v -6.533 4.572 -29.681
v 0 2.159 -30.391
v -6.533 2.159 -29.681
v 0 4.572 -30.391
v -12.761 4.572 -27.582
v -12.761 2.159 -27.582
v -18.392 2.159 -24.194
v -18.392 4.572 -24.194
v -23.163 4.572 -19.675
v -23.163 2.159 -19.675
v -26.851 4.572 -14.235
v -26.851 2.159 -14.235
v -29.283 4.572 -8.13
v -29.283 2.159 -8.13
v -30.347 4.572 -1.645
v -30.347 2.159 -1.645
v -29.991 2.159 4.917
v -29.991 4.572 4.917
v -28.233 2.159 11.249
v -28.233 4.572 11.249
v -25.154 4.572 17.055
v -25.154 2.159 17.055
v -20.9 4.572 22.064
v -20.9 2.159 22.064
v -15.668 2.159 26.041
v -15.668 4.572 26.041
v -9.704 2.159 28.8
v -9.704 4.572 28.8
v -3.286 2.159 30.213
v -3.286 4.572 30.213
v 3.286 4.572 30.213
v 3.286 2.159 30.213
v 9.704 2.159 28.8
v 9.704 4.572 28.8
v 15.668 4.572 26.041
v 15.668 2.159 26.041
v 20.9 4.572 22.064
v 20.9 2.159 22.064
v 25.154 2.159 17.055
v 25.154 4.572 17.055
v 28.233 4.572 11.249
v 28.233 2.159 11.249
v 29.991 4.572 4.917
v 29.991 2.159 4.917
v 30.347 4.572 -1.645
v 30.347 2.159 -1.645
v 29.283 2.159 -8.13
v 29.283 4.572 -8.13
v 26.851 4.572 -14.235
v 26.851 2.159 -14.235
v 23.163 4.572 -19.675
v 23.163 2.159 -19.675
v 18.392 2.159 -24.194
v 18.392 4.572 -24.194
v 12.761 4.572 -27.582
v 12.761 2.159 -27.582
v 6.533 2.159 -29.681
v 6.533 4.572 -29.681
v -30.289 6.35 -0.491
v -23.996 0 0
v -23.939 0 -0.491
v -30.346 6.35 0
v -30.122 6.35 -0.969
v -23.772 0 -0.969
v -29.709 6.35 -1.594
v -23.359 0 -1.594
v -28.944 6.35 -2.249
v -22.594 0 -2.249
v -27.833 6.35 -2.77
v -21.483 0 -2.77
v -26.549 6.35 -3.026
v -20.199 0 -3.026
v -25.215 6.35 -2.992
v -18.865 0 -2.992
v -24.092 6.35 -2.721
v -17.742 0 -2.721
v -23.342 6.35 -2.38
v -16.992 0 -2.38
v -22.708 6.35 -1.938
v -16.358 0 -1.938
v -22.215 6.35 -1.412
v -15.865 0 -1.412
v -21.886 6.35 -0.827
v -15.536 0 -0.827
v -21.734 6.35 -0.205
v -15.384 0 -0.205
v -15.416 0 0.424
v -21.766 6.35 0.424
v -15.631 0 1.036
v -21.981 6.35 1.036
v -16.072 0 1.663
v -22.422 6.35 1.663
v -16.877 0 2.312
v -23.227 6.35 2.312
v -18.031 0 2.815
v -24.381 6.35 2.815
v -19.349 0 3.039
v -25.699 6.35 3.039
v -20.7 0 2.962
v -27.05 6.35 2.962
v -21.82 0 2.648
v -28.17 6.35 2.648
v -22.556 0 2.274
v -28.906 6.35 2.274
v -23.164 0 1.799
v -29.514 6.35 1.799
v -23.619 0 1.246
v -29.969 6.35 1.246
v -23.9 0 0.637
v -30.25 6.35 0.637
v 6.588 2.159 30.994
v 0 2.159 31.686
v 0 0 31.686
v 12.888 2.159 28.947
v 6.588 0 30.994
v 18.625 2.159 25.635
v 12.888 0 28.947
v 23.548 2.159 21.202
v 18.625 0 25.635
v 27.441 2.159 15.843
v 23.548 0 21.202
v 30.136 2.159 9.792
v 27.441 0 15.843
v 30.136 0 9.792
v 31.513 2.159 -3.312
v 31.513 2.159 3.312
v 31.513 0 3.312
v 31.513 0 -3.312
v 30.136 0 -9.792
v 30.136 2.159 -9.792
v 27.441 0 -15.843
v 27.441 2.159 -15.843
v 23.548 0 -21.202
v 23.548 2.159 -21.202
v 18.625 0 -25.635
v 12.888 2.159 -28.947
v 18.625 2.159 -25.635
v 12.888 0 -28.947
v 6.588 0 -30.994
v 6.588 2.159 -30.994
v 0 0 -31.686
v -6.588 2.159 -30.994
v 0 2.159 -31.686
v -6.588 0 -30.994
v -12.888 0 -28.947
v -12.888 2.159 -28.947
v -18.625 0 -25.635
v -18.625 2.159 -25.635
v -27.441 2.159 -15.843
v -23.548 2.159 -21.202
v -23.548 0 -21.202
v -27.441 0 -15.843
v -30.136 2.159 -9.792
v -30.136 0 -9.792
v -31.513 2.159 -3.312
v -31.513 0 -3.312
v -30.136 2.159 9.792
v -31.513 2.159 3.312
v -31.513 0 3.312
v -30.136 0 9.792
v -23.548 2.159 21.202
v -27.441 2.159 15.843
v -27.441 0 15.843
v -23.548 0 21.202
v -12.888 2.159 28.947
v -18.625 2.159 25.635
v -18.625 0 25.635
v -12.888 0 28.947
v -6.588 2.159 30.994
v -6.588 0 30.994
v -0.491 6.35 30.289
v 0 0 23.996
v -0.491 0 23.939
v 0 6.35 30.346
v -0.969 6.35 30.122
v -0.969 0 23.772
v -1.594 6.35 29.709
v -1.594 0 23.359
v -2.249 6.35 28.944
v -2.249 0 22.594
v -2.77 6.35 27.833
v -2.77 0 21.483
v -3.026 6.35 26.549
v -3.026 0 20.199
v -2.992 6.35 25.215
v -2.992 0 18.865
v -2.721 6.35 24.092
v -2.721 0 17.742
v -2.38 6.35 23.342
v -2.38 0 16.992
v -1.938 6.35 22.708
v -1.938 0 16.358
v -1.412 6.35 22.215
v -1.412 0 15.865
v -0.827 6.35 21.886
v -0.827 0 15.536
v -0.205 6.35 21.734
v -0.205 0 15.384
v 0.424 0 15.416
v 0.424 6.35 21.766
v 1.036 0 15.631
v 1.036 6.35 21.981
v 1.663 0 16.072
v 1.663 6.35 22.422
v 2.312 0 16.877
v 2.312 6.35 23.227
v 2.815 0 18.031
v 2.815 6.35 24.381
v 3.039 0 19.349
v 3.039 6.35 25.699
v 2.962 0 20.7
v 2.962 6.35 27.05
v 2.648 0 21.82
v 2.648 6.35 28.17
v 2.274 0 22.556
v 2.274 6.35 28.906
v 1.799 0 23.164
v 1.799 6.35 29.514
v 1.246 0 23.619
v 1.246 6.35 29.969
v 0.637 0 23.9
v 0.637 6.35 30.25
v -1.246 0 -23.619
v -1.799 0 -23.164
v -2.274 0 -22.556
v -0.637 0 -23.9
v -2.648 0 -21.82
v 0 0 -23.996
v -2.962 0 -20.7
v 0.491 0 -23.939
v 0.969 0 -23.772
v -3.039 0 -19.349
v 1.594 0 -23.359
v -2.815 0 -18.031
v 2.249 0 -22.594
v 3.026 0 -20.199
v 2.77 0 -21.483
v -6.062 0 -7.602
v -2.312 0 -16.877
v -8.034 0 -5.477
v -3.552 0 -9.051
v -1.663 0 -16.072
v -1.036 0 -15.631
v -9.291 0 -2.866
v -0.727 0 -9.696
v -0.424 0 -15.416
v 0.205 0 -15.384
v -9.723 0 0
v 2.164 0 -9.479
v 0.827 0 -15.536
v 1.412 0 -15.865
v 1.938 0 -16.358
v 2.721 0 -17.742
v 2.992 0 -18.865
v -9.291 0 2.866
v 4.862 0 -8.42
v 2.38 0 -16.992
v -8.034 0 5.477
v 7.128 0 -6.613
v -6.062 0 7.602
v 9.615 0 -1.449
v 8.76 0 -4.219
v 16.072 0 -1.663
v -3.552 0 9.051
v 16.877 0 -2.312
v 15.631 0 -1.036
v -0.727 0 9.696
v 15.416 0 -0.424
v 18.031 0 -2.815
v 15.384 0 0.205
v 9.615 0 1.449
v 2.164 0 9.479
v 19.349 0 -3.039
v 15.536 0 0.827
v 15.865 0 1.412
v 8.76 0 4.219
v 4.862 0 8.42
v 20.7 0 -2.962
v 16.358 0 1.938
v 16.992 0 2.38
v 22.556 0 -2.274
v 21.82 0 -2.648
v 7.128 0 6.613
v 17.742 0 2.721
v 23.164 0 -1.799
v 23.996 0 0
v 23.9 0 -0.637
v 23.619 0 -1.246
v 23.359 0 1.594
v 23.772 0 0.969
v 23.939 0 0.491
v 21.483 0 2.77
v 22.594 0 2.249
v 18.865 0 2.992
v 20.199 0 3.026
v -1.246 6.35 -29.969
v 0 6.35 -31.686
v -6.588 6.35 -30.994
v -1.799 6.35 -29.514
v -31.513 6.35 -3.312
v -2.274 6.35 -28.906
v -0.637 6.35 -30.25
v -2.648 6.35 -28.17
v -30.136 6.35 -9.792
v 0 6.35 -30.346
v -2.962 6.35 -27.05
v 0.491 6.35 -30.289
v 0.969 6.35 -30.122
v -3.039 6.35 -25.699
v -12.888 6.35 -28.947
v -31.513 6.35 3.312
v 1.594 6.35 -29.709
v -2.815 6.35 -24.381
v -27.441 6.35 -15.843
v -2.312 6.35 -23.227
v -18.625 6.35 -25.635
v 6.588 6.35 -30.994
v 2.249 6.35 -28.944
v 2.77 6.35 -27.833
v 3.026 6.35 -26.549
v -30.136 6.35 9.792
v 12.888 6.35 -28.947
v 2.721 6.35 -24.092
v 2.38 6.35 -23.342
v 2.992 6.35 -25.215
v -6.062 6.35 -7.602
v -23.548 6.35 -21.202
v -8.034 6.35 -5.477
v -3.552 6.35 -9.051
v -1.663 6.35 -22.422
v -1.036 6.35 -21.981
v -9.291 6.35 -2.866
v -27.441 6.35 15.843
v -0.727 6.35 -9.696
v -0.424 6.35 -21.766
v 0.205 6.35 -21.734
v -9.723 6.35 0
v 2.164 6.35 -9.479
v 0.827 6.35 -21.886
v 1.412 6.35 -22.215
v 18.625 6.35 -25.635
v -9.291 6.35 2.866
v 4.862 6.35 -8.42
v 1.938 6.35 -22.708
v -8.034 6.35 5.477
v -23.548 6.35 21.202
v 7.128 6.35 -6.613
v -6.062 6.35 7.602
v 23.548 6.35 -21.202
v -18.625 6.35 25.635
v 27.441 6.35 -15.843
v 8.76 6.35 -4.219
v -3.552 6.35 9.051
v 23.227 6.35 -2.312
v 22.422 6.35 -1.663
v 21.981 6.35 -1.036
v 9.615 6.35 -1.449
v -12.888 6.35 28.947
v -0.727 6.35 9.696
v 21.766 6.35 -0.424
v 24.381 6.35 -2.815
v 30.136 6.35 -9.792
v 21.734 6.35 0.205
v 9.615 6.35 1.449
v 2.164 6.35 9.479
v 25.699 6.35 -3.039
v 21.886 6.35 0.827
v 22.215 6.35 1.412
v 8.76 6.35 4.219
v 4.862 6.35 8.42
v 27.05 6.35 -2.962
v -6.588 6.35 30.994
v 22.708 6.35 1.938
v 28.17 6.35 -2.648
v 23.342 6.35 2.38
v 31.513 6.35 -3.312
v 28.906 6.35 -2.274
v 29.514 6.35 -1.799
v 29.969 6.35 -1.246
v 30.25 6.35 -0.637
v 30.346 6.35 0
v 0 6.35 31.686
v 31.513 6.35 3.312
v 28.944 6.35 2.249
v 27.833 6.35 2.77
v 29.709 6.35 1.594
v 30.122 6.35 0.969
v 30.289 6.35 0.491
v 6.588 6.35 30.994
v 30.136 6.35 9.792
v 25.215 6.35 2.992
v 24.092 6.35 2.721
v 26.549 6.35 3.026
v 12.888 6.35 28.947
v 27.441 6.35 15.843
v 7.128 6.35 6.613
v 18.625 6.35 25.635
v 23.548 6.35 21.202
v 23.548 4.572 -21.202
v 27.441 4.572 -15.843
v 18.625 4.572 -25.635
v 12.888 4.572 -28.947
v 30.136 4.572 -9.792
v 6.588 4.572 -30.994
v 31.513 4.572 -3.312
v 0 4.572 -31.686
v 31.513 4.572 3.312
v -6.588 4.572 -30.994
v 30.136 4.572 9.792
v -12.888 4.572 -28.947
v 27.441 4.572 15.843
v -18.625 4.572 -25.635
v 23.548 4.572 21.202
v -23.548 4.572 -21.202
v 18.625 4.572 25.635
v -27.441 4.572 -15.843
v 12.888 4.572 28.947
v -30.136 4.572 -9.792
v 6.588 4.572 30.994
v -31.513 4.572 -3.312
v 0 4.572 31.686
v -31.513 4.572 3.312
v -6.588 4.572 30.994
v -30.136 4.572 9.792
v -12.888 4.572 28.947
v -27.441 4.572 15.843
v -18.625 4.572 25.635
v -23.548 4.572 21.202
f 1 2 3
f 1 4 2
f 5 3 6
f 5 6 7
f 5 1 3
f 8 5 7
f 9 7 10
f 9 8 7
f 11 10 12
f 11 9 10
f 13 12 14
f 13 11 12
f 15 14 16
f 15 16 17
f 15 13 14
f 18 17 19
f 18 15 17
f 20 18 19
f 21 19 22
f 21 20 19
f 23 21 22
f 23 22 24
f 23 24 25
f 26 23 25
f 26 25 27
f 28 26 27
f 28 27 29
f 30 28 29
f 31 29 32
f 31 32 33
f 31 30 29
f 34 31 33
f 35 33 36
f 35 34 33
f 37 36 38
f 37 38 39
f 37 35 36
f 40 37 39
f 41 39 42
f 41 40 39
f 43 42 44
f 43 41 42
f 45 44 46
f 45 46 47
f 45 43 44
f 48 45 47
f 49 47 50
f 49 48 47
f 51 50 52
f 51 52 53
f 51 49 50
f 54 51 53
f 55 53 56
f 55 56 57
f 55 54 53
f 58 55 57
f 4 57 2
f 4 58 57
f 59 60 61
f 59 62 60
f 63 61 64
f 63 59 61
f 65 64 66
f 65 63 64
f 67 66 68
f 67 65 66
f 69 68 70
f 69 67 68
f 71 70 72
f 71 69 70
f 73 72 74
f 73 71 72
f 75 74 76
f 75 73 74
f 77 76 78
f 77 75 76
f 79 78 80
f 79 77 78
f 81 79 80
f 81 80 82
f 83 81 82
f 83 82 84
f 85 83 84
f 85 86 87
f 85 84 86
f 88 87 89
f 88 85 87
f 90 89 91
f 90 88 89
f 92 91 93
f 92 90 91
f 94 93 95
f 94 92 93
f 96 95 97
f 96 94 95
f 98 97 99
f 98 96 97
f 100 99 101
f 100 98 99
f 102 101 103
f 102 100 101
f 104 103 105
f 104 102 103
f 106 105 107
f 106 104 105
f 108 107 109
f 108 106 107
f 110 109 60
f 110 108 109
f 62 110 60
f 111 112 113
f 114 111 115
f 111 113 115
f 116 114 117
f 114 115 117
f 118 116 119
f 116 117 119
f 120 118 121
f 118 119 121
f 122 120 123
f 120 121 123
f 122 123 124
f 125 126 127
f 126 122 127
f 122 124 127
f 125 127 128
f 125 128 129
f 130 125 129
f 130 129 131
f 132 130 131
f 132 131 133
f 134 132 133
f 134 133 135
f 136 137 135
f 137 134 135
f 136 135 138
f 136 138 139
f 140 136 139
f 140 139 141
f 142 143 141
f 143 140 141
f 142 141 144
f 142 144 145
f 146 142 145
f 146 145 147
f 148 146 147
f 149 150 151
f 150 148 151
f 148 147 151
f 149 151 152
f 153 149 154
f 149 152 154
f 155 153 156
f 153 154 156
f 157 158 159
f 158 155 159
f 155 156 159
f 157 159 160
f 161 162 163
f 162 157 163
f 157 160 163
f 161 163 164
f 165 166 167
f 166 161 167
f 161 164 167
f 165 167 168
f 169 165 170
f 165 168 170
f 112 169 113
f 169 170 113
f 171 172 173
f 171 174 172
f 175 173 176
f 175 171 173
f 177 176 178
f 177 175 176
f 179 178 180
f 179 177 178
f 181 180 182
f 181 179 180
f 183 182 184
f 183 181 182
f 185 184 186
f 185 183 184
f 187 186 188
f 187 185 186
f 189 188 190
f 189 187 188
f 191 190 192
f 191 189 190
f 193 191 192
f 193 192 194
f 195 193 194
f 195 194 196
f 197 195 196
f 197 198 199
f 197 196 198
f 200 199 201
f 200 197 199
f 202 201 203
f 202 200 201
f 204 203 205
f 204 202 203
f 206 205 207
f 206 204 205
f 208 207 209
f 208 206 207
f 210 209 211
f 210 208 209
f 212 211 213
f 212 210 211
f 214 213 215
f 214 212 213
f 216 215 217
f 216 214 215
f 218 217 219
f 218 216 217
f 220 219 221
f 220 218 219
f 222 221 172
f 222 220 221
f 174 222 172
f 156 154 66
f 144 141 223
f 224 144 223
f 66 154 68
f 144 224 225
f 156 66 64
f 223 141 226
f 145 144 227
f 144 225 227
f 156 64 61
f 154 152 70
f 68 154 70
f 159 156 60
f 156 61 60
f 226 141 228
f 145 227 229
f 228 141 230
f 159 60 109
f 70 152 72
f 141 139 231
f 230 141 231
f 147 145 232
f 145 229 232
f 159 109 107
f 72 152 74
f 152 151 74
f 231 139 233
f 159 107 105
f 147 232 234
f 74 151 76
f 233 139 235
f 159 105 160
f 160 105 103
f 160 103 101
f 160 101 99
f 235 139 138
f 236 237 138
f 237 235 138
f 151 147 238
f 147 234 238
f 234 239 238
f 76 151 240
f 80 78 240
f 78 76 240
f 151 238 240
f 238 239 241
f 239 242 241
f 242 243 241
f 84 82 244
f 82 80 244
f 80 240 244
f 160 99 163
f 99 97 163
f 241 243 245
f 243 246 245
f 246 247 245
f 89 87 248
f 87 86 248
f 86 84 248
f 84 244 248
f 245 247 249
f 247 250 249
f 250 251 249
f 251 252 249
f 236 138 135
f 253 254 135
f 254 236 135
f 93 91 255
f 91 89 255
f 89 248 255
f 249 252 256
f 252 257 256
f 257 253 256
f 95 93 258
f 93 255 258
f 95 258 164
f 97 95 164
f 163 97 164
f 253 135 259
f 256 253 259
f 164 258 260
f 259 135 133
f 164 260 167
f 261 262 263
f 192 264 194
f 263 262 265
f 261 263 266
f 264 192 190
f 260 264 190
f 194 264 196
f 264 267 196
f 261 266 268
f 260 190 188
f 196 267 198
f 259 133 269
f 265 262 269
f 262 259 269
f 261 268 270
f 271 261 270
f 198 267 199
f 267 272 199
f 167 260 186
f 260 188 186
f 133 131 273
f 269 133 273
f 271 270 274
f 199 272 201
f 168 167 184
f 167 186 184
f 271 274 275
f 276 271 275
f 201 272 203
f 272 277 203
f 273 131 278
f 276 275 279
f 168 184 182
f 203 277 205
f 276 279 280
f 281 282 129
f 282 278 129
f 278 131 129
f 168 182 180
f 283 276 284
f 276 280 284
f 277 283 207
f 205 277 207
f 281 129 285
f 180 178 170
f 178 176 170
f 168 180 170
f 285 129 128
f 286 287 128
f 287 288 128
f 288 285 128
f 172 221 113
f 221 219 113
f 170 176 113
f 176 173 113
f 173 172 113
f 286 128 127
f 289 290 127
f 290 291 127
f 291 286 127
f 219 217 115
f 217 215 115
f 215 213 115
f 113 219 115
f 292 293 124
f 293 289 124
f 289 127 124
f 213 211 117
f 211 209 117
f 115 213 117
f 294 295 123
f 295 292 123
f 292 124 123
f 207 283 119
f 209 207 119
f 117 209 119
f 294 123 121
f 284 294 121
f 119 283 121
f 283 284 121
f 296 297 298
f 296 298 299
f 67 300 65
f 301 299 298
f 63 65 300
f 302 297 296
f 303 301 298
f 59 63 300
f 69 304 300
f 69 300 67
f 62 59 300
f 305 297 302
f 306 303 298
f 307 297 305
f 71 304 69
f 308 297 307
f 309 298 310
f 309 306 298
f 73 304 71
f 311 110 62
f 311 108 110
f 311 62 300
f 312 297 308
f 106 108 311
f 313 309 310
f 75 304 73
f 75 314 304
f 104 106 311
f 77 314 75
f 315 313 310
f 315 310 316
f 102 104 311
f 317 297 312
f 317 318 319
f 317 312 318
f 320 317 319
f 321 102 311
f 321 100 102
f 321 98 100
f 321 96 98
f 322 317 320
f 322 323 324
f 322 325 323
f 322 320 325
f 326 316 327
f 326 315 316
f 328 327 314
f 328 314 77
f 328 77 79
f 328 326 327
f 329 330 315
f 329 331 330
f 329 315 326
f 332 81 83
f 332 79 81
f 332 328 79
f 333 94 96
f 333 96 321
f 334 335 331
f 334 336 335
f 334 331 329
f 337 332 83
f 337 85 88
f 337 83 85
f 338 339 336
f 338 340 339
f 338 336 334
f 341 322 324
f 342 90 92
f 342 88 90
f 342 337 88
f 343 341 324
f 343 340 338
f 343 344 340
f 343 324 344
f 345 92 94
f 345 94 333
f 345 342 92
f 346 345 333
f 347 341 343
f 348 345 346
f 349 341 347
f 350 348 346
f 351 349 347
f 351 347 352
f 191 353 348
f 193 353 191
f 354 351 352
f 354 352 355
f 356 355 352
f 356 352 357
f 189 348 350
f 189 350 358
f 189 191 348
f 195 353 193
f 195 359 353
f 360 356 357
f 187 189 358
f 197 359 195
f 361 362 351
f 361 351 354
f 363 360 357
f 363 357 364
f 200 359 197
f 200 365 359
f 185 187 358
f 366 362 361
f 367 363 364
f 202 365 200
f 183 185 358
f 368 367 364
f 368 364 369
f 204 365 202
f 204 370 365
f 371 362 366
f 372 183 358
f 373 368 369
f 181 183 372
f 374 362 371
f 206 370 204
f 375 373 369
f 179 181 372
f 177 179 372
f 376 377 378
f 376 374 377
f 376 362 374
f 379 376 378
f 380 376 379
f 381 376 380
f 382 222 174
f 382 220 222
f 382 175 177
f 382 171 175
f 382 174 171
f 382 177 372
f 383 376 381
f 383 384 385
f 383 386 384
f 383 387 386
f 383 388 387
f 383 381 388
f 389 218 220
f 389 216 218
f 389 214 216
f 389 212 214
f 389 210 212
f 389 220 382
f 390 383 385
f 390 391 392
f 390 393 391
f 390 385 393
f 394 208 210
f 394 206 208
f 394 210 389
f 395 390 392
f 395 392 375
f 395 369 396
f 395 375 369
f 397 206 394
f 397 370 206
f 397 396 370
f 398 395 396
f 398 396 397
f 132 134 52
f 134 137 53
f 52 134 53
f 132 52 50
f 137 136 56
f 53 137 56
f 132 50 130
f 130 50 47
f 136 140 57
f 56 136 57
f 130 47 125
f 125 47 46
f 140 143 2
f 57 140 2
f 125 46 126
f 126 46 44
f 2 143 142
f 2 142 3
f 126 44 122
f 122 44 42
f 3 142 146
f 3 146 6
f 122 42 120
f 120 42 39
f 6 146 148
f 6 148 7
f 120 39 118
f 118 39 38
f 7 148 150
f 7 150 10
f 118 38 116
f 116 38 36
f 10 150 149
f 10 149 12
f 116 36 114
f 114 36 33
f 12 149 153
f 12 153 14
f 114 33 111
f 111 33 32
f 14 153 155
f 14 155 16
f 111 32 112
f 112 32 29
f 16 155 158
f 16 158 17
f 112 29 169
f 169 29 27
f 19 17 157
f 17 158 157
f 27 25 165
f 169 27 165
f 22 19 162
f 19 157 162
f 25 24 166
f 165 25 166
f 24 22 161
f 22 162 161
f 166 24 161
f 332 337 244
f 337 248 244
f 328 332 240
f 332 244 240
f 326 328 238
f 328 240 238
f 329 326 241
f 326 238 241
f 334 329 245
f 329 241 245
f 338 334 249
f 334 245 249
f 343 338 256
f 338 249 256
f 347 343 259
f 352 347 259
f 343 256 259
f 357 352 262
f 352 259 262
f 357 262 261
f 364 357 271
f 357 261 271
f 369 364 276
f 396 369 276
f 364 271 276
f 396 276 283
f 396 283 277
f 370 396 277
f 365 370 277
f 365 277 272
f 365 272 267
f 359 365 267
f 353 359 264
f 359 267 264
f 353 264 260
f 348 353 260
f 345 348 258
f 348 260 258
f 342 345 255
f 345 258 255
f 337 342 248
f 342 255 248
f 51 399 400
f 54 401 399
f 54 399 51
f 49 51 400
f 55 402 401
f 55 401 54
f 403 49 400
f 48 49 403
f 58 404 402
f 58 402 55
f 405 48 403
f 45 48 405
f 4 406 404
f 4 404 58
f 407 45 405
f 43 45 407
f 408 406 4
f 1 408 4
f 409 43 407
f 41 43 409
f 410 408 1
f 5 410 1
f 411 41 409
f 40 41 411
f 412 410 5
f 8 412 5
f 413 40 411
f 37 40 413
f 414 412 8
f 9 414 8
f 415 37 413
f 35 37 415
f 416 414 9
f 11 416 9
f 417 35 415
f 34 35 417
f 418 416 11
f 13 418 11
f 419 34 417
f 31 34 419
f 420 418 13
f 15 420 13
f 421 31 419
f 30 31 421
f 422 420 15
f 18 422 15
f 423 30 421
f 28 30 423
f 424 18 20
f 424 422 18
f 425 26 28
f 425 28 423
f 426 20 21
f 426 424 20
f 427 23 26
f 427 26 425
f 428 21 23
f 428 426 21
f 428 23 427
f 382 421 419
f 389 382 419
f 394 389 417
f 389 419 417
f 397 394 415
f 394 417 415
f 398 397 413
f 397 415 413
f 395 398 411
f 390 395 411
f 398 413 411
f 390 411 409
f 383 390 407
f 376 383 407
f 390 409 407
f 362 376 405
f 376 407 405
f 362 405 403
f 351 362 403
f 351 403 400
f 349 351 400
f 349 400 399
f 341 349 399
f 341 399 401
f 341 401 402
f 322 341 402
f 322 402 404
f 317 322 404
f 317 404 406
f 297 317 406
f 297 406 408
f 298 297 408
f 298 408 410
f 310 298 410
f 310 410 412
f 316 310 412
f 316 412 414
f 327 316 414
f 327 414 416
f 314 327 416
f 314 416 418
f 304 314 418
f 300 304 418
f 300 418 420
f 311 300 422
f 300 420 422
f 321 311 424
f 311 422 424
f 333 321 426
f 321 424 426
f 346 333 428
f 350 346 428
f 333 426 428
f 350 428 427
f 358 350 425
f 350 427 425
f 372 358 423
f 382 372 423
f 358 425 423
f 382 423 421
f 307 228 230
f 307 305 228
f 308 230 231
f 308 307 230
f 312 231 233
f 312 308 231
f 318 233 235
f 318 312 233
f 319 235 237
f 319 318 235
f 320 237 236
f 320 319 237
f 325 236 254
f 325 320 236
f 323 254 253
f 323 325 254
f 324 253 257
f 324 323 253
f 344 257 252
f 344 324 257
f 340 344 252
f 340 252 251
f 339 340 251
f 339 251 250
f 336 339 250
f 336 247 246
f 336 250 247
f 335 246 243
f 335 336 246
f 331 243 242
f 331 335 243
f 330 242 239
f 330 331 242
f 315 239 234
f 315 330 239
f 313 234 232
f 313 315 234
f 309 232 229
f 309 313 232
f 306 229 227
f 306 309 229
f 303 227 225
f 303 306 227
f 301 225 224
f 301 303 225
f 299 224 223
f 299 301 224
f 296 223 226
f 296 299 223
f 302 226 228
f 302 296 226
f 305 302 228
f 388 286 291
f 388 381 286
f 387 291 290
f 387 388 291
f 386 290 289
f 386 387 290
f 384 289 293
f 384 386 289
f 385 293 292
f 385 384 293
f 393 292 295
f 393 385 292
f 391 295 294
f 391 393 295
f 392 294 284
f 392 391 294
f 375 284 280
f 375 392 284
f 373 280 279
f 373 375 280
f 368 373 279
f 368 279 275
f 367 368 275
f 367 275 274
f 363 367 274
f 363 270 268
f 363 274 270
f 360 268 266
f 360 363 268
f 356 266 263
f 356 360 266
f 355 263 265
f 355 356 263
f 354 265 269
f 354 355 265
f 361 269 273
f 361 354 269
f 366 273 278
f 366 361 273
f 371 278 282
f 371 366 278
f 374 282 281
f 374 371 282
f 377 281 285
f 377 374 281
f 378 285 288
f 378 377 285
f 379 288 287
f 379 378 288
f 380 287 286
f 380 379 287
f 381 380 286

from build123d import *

# Parameters (mm, degrees)
SKETCH1_R                   = 31.6865
BOSS_EXTRUDE1_DEPTH         = 6.35
CIRPATTERN1_COUNT           = 4
SKETCH5_W                   = 1.2954
SKETCH5_H                   = 2.413
F_3_4_CLEARANCE_HOLE1_D     = 19.44624
F_3_4_CLEARANCE_HOLE1_DEPTH = 6.35
F_3_4_CLEARANCE_HOLE1_TIP   = 5.842239902


with BuildPart() as part:
    # Sketch1 → Boss-Extrude1 (new body)
    with BuildSketch(Plane(origin=(0, 0, 0), x_dir=(1, 0, 0), z_dir=(0, 1, 0))):
        with Locations(Location((0, 0, 0), (0, 0, 270))):
            Circle(SKETCH1_R)
    extrude(amount=BOSS_EXTRUDE1_DEPTH)

    # Sketch4 → Cut-Revolve1 (revolve, cut)
    with BuildSketch(Plane.XY, mode=Mode.PRIVATE) as cut_revolve1_sk:
        Polygon((-28.472660076, 8.787660076), (-22.86, 3.175), (-17.247339924, -2.437660076), (-15.092078455, -0.282398607), (-26.317398607, 10.942921545), align=None)
    cut_revolve1 = revolve(cut_revolve1_sk.sketch.rotate(Axis((-28.472660076, 8.787660076, 0), (0.7071067811865512, -0.7071067811865439, 0)), 180), axis=Axis((-28.472660076, 8.787660076, 0), (0.7071067811865512, -0.7071067811865439, 0)), mode=Mode.SUBTRACT)

    # CirPattern1: Cut-Revolve1 ×4 about axis
    cirpattern1_axis = Axis((0, -0.3175, 0), (0, 1, 0))
    for i in range(1, CIRPATTERN1_COUNT):
        add(cut_revolve1.rotate(cirpattern1_axis, i * 360 / CIRPATTERN1_COUNT), mode=Mode.SUBTRACT)

    # Sketch5 → Cut-Revolve2 (revolve, cut)
    with BuildSketch(Plane.XY, mode=Mode.PRIVATE) as cut_revolve2_sk:
        with Locations((31.0388, 3.3655)):
            Rectangle(SKETCH5_W, SKETCH5_H)
    revolve(cut_revolve2_sk.sketch.rotate(Axis((0, -0.3175, 0), (0, 1, 0)), 90), axis=Axis((0, -0.3175, 0), (0, 1, 0)), mode=Mode.SUBTRACT)

    # 3/4 Clearance Hole1
    with Locations(Plane(origin=(0, 6.35, 0), x_dir=(1, 0, 0), z_dir=(0, 1, 0))):
        with Locations((0, 0)):
            Hole(F_3_4_CLEARANCE_HOLE1_D / 2, depth=F_3_4_CLEARANCE_HOLE1_DEPTH)
            with Locations((0, 0, -(F_3_4_CLEARANCE_HOLE1_DEPTH + F_3_4_CLEARANCE_HOLE1_TIP / 2))):  # 118° drill point
                Cone(0, F_3_4_CLEARANCE_HOLE1_D / 2, F_3_4_CLEARANCE_HOLE1_TIP, mode=Mode.SUBTRACT)


solid = part.part
